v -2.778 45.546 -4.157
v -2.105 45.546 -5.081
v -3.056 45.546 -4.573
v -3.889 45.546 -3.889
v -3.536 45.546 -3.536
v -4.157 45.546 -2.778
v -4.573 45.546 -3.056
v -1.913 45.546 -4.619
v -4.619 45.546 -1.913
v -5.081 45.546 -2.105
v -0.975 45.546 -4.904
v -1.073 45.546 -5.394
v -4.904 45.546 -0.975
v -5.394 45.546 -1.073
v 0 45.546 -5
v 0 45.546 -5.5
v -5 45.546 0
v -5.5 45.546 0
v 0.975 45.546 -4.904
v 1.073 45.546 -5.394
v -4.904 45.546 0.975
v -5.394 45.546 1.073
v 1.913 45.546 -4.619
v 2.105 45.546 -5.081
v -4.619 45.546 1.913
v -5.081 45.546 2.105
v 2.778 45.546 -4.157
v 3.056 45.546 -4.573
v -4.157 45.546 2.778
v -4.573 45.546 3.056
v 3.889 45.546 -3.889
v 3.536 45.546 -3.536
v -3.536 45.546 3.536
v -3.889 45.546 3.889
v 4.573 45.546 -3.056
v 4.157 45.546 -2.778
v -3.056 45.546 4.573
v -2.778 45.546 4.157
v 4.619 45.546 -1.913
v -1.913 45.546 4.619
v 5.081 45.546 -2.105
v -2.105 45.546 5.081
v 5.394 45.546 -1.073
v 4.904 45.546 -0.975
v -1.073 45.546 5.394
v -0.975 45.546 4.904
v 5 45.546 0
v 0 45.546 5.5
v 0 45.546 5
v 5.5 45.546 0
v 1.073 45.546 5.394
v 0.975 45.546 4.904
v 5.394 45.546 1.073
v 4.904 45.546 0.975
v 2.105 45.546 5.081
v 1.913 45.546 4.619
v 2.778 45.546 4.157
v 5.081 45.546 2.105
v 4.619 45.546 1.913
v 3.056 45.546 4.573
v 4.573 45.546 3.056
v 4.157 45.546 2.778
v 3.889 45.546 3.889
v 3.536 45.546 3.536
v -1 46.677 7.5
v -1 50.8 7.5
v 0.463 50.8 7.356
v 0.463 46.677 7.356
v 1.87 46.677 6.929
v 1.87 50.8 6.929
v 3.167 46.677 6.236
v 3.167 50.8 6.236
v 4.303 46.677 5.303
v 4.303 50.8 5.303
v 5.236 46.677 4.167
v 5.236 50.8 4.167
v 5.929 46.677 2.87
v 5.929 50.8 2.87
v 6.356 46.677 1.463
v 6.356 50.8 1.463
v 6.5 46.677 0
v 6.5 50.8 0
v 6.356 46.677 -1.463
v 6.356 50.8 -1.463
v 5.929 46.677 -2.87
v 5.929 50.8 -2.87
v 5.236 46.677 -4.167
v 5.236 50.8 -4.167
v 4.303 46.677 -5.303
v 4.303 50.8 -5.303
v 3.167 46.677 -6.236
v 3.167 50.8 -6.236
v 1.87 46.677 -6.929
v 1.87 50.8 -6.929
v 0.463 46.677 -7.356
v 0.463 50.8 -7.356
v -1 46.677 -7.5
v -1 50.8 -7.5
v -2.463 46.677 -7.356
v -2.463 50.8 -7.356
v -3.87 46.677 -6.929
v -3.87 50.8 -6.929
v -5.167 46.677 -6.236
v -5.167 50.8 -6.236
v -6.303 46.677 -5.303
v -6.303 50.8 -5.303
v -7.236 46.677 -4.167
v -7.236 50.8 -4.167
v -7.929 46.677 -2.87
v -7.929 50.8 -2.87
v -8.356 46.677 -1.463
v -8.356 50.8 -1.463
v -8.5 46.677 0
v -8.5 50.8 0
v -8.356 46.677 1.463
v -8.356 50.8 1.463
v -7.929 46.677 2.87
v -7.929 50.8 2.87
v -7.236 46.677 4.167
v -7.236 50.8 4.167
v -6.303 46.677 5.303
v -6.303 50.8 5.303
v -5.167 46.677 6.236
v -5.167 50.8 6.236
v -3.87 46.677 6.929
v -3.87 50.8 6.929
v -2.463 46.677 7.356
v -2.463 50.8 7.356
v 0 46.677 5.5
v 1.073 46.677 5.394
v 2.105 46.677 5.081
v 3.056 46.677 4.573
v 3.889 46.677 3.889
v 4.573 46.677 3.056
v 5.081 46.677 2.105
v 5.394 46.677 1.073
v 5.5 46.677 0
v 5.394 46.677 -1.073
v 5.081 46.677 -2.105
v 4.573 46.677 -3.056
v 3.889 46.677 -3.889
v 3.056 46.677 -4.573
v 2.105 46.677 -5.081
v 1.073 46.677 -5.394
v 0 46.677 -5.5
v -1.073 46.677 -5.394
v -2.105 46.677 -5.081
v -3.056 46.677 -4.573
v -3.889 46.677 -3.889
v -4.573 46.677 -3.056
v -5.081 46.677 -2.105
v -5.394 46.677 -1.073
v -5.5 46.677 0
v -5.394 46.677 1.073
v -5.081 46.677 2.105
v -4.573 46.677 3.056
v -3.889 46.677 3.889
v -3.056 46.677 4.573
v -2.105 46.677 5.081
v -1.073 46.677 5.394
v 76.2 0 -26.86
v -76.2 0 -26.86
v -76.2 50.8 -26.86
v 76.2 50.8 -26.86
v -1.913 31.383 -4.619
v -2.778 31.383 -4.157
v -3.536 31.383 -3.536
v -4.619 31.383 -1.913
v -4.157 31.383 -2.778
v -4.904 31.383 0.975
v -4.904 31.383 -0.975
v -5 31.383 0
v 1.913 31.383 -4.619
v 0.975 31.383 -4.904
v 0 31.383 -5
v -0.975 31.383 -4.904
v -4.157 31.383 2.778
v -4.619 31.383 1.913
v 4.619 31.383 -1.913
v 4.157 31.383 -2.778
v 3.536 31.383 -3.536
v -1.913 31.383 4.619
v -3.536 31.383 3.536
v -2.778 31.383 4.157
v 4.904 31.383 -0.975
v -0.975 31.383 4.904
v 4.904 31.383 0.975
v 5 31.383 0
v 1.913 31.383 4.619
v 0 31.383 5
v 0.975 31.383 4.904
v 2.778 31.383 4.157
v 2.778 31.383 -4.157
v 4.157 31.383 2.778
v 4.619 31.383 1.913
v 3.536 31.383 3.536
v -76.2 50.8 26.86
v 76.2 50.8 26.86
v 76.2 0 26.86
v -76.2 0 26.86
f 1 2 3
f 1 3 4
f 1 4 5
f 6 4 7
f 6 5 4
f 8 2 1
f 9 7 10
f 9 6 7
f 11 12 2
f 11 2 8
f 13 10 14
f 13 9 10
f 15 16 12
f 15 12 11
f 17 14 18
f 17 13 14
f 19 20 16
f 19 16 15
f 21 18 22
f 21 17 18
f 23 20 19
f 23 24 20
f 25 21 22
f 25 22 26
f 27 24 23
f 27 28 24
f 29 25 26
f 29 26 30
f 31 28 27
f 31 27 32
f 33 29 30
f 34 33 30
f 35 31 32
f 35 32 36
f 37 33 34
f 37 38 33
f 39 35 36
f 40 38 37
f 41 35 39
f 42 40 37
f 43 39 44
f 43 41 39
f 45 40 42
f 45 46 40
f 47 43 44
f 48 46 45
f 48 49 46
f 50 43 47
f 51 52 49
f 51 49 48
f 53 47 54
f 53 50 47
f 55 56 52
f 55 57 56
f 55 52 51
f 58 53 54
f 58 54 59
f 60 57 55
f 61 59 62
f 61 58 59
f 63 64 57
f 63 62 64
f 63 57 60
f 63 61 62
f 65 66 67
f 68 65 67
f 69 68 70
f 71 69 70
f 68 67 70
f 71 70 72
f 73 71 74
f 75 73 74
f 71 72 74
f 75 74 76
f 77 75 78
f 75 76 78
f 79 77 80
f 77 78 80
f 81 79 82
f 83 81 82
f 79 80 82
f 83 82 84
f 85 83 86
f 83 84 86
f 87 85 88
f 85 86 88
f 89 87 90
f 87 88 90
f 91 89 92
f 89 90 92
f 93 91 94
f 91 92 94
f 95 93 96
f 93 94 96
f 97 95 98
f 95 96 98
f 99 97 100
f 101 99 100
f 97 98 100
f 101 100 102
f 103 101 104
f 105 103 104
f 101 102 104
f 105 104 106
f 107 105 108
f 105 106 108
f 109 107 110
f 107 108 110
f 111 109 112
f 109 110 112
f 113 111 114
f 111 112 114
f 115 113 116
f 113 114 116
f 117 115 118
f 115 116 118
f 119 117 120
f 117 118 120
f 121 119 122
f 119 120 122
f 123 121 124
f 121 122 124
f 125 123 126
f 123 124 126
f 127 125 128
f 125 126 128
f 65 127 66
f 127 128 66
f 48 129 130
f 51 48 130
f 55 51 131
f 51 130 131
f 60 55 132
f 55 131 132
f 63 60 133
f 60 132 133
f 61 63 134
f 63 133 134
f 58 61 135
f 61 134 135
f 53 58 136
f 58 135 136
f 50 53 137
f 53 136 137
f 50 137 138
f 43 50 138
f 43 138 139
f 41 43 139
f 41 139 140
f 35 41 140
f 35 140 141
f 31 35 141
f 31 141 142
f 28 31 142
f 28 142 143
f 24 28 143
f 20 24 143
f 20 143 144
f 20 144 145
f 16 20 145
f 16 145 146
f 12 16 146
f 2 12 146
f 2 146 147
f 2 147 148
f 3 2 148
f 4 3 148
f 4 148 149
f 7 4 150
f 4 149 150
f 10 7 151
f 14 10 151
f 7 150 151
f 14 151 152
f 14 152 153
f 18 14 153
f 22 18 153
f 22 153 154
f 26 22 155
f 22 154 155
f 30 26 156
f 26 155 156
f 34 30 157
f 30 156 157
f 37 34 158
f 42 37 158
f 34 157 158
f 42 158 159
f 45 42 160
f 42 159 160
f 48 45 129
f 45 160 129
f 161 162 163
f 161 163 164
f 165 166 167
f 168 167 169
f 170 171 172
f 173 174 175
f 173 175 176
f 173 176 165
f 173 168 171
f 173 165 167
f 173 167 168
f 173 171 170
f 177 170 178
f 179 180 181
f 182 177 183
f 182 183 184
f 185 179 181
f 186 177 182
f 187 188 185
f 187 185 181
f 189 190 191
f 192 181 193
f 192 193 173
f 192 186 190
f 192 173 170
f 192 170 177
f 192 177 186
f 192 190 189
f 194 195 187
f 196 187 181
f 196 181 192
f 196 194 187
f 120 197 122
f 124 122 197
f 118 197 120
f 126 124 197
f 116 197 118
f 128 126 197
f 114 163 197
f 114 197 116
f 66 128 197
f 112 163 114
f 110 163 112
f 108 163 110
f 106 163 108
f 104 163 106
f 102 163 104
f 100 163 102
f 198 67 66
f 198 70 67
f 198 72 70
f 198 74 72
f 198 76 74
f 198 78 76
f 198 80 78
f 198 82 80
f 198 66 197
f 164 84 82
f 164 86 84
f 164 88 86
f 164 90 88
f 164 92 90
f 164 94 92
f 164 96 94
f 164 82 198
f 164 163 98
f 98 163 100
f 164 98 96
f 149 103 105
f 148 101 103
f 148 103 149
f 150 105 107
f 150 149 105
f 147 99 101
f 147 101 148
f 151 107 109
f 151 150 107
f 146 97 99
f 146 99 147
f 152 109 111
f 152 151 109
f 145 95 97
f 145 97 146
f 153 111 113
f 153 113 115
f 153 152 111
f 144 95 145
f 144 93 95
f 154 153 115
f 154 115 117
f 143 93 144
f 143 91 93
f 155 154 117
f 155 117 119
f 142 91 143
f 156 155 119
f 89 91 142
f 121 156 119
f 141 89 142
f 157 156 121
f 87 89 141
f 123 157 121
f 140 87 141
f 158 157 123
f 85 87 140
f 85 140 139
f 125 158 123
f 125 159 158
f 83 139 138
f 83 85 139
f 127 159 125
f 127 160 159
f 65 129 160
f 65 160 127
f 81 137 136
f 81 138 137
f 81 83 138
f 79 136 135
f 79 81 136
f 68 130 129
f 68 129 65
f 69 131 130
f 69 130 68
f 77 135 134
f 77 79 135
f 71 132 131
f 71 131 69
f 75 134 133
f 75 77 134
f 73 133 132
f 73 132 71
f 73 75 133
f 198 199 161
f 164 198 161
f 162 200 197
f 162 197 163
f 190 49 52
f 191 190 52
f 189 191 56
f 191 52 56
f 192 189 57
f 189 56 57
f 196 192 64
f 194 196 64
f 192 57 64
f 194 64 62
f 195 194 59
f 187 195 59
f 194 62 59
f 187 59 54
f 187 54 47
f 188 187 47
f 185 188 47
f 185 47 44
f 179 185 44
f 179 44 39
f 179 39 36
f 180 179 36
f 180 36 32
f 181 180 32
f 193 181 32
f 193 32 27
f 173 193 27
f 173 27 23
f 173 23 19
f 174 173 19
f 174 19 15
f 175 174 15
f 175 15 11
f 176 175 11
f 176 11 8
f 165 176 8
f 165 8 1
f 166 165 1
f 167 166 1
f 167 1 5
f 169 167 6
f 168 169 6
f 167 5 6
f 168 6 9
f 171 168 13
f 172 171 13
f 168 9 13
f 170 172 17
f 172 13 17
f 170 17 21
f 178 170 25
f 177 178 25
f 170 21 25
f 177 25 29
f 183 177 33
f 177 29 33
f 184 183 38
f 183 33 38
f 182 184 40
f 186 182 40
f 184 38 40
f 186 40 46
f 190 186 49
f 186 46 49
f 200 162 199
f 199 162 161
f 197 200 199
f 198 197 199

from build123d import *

# Parameters (mm, degrees)
SKETCH1_W           = 152.4
SKETCH1_H           = 53.721
BOSS_EXTRUDE1_DEPTH = 50.8
SKETCH2_R           = 5
CUT_EXTRUDE1_DEPTH  = 19.416667
SKETCH2_4_R         = 5.5
SKETCH2_4_R_2       = 5
CUT_EXTRUDE2_DEPTH  = 5.254167
SKETCH2_5_R         = 7.5
SKETCH2_5_R_2       = 5.5
CUT_EXTRUDE3_DEPTH  = 4.123106


with BuildPart() as part:
    # Sketch1 → Boss-Extrude1 (new body)
    with BuildSketch(Plane(origin=(0, 0, 0), x_dir=(1, 0, 0), z_dir=(0, 1, 0))):
        Rectangle(SKETCH1_W, SKETCH1_H)
    extrude(amount=BOSS_EXTRUDE1_DEPTH)

    # Sketch2 → Cut-Extrude1 (cut)
    with BuildSketch(Plane(origin=(0, 50.8, 0), x_dir=(1, 0, 0), z_dir=(0, 1, 0))):
        Circle(SKETCH2_R)
    extrude(amount=-CUT_EXTRUDE1_DEPTH, mode=Mode.SUBTRACT)

    # Sketch2<4> → Cut-Extrude2 (cut)
    with BuildSketch(Plane(origin=(0, 50.8, 0), x_dir=(1, 0, 0), z_dir=(0, 1, 0))):
        Circle(SKETCH2_4_R)
        Circle(SKETCH2_4_R_2, mode=Mode.SUBTRACT)
    extrude(amount=-CUT_EXTRUDE2_DEPTH, mode=Mode.SUBTRACT)

    # Sketch2<5> → Cut-Extrude3 (cut)
    with BuildSketch(Plane(origin=(0, 50.8, 0), x_dir=(1, 0, 0), z_dir=(0, 1, 0))):
        with Locations((-1, 0)):
            Circle(SKETCH2_5_R)
        Circle(SKETCH2_5_R_2, mode=Mode.SUBTRACT)
    extrude(amount=-CUT_EXTRUDE3_DEPTH, mode=Mode.SUBTRACT)


solid = part.part
